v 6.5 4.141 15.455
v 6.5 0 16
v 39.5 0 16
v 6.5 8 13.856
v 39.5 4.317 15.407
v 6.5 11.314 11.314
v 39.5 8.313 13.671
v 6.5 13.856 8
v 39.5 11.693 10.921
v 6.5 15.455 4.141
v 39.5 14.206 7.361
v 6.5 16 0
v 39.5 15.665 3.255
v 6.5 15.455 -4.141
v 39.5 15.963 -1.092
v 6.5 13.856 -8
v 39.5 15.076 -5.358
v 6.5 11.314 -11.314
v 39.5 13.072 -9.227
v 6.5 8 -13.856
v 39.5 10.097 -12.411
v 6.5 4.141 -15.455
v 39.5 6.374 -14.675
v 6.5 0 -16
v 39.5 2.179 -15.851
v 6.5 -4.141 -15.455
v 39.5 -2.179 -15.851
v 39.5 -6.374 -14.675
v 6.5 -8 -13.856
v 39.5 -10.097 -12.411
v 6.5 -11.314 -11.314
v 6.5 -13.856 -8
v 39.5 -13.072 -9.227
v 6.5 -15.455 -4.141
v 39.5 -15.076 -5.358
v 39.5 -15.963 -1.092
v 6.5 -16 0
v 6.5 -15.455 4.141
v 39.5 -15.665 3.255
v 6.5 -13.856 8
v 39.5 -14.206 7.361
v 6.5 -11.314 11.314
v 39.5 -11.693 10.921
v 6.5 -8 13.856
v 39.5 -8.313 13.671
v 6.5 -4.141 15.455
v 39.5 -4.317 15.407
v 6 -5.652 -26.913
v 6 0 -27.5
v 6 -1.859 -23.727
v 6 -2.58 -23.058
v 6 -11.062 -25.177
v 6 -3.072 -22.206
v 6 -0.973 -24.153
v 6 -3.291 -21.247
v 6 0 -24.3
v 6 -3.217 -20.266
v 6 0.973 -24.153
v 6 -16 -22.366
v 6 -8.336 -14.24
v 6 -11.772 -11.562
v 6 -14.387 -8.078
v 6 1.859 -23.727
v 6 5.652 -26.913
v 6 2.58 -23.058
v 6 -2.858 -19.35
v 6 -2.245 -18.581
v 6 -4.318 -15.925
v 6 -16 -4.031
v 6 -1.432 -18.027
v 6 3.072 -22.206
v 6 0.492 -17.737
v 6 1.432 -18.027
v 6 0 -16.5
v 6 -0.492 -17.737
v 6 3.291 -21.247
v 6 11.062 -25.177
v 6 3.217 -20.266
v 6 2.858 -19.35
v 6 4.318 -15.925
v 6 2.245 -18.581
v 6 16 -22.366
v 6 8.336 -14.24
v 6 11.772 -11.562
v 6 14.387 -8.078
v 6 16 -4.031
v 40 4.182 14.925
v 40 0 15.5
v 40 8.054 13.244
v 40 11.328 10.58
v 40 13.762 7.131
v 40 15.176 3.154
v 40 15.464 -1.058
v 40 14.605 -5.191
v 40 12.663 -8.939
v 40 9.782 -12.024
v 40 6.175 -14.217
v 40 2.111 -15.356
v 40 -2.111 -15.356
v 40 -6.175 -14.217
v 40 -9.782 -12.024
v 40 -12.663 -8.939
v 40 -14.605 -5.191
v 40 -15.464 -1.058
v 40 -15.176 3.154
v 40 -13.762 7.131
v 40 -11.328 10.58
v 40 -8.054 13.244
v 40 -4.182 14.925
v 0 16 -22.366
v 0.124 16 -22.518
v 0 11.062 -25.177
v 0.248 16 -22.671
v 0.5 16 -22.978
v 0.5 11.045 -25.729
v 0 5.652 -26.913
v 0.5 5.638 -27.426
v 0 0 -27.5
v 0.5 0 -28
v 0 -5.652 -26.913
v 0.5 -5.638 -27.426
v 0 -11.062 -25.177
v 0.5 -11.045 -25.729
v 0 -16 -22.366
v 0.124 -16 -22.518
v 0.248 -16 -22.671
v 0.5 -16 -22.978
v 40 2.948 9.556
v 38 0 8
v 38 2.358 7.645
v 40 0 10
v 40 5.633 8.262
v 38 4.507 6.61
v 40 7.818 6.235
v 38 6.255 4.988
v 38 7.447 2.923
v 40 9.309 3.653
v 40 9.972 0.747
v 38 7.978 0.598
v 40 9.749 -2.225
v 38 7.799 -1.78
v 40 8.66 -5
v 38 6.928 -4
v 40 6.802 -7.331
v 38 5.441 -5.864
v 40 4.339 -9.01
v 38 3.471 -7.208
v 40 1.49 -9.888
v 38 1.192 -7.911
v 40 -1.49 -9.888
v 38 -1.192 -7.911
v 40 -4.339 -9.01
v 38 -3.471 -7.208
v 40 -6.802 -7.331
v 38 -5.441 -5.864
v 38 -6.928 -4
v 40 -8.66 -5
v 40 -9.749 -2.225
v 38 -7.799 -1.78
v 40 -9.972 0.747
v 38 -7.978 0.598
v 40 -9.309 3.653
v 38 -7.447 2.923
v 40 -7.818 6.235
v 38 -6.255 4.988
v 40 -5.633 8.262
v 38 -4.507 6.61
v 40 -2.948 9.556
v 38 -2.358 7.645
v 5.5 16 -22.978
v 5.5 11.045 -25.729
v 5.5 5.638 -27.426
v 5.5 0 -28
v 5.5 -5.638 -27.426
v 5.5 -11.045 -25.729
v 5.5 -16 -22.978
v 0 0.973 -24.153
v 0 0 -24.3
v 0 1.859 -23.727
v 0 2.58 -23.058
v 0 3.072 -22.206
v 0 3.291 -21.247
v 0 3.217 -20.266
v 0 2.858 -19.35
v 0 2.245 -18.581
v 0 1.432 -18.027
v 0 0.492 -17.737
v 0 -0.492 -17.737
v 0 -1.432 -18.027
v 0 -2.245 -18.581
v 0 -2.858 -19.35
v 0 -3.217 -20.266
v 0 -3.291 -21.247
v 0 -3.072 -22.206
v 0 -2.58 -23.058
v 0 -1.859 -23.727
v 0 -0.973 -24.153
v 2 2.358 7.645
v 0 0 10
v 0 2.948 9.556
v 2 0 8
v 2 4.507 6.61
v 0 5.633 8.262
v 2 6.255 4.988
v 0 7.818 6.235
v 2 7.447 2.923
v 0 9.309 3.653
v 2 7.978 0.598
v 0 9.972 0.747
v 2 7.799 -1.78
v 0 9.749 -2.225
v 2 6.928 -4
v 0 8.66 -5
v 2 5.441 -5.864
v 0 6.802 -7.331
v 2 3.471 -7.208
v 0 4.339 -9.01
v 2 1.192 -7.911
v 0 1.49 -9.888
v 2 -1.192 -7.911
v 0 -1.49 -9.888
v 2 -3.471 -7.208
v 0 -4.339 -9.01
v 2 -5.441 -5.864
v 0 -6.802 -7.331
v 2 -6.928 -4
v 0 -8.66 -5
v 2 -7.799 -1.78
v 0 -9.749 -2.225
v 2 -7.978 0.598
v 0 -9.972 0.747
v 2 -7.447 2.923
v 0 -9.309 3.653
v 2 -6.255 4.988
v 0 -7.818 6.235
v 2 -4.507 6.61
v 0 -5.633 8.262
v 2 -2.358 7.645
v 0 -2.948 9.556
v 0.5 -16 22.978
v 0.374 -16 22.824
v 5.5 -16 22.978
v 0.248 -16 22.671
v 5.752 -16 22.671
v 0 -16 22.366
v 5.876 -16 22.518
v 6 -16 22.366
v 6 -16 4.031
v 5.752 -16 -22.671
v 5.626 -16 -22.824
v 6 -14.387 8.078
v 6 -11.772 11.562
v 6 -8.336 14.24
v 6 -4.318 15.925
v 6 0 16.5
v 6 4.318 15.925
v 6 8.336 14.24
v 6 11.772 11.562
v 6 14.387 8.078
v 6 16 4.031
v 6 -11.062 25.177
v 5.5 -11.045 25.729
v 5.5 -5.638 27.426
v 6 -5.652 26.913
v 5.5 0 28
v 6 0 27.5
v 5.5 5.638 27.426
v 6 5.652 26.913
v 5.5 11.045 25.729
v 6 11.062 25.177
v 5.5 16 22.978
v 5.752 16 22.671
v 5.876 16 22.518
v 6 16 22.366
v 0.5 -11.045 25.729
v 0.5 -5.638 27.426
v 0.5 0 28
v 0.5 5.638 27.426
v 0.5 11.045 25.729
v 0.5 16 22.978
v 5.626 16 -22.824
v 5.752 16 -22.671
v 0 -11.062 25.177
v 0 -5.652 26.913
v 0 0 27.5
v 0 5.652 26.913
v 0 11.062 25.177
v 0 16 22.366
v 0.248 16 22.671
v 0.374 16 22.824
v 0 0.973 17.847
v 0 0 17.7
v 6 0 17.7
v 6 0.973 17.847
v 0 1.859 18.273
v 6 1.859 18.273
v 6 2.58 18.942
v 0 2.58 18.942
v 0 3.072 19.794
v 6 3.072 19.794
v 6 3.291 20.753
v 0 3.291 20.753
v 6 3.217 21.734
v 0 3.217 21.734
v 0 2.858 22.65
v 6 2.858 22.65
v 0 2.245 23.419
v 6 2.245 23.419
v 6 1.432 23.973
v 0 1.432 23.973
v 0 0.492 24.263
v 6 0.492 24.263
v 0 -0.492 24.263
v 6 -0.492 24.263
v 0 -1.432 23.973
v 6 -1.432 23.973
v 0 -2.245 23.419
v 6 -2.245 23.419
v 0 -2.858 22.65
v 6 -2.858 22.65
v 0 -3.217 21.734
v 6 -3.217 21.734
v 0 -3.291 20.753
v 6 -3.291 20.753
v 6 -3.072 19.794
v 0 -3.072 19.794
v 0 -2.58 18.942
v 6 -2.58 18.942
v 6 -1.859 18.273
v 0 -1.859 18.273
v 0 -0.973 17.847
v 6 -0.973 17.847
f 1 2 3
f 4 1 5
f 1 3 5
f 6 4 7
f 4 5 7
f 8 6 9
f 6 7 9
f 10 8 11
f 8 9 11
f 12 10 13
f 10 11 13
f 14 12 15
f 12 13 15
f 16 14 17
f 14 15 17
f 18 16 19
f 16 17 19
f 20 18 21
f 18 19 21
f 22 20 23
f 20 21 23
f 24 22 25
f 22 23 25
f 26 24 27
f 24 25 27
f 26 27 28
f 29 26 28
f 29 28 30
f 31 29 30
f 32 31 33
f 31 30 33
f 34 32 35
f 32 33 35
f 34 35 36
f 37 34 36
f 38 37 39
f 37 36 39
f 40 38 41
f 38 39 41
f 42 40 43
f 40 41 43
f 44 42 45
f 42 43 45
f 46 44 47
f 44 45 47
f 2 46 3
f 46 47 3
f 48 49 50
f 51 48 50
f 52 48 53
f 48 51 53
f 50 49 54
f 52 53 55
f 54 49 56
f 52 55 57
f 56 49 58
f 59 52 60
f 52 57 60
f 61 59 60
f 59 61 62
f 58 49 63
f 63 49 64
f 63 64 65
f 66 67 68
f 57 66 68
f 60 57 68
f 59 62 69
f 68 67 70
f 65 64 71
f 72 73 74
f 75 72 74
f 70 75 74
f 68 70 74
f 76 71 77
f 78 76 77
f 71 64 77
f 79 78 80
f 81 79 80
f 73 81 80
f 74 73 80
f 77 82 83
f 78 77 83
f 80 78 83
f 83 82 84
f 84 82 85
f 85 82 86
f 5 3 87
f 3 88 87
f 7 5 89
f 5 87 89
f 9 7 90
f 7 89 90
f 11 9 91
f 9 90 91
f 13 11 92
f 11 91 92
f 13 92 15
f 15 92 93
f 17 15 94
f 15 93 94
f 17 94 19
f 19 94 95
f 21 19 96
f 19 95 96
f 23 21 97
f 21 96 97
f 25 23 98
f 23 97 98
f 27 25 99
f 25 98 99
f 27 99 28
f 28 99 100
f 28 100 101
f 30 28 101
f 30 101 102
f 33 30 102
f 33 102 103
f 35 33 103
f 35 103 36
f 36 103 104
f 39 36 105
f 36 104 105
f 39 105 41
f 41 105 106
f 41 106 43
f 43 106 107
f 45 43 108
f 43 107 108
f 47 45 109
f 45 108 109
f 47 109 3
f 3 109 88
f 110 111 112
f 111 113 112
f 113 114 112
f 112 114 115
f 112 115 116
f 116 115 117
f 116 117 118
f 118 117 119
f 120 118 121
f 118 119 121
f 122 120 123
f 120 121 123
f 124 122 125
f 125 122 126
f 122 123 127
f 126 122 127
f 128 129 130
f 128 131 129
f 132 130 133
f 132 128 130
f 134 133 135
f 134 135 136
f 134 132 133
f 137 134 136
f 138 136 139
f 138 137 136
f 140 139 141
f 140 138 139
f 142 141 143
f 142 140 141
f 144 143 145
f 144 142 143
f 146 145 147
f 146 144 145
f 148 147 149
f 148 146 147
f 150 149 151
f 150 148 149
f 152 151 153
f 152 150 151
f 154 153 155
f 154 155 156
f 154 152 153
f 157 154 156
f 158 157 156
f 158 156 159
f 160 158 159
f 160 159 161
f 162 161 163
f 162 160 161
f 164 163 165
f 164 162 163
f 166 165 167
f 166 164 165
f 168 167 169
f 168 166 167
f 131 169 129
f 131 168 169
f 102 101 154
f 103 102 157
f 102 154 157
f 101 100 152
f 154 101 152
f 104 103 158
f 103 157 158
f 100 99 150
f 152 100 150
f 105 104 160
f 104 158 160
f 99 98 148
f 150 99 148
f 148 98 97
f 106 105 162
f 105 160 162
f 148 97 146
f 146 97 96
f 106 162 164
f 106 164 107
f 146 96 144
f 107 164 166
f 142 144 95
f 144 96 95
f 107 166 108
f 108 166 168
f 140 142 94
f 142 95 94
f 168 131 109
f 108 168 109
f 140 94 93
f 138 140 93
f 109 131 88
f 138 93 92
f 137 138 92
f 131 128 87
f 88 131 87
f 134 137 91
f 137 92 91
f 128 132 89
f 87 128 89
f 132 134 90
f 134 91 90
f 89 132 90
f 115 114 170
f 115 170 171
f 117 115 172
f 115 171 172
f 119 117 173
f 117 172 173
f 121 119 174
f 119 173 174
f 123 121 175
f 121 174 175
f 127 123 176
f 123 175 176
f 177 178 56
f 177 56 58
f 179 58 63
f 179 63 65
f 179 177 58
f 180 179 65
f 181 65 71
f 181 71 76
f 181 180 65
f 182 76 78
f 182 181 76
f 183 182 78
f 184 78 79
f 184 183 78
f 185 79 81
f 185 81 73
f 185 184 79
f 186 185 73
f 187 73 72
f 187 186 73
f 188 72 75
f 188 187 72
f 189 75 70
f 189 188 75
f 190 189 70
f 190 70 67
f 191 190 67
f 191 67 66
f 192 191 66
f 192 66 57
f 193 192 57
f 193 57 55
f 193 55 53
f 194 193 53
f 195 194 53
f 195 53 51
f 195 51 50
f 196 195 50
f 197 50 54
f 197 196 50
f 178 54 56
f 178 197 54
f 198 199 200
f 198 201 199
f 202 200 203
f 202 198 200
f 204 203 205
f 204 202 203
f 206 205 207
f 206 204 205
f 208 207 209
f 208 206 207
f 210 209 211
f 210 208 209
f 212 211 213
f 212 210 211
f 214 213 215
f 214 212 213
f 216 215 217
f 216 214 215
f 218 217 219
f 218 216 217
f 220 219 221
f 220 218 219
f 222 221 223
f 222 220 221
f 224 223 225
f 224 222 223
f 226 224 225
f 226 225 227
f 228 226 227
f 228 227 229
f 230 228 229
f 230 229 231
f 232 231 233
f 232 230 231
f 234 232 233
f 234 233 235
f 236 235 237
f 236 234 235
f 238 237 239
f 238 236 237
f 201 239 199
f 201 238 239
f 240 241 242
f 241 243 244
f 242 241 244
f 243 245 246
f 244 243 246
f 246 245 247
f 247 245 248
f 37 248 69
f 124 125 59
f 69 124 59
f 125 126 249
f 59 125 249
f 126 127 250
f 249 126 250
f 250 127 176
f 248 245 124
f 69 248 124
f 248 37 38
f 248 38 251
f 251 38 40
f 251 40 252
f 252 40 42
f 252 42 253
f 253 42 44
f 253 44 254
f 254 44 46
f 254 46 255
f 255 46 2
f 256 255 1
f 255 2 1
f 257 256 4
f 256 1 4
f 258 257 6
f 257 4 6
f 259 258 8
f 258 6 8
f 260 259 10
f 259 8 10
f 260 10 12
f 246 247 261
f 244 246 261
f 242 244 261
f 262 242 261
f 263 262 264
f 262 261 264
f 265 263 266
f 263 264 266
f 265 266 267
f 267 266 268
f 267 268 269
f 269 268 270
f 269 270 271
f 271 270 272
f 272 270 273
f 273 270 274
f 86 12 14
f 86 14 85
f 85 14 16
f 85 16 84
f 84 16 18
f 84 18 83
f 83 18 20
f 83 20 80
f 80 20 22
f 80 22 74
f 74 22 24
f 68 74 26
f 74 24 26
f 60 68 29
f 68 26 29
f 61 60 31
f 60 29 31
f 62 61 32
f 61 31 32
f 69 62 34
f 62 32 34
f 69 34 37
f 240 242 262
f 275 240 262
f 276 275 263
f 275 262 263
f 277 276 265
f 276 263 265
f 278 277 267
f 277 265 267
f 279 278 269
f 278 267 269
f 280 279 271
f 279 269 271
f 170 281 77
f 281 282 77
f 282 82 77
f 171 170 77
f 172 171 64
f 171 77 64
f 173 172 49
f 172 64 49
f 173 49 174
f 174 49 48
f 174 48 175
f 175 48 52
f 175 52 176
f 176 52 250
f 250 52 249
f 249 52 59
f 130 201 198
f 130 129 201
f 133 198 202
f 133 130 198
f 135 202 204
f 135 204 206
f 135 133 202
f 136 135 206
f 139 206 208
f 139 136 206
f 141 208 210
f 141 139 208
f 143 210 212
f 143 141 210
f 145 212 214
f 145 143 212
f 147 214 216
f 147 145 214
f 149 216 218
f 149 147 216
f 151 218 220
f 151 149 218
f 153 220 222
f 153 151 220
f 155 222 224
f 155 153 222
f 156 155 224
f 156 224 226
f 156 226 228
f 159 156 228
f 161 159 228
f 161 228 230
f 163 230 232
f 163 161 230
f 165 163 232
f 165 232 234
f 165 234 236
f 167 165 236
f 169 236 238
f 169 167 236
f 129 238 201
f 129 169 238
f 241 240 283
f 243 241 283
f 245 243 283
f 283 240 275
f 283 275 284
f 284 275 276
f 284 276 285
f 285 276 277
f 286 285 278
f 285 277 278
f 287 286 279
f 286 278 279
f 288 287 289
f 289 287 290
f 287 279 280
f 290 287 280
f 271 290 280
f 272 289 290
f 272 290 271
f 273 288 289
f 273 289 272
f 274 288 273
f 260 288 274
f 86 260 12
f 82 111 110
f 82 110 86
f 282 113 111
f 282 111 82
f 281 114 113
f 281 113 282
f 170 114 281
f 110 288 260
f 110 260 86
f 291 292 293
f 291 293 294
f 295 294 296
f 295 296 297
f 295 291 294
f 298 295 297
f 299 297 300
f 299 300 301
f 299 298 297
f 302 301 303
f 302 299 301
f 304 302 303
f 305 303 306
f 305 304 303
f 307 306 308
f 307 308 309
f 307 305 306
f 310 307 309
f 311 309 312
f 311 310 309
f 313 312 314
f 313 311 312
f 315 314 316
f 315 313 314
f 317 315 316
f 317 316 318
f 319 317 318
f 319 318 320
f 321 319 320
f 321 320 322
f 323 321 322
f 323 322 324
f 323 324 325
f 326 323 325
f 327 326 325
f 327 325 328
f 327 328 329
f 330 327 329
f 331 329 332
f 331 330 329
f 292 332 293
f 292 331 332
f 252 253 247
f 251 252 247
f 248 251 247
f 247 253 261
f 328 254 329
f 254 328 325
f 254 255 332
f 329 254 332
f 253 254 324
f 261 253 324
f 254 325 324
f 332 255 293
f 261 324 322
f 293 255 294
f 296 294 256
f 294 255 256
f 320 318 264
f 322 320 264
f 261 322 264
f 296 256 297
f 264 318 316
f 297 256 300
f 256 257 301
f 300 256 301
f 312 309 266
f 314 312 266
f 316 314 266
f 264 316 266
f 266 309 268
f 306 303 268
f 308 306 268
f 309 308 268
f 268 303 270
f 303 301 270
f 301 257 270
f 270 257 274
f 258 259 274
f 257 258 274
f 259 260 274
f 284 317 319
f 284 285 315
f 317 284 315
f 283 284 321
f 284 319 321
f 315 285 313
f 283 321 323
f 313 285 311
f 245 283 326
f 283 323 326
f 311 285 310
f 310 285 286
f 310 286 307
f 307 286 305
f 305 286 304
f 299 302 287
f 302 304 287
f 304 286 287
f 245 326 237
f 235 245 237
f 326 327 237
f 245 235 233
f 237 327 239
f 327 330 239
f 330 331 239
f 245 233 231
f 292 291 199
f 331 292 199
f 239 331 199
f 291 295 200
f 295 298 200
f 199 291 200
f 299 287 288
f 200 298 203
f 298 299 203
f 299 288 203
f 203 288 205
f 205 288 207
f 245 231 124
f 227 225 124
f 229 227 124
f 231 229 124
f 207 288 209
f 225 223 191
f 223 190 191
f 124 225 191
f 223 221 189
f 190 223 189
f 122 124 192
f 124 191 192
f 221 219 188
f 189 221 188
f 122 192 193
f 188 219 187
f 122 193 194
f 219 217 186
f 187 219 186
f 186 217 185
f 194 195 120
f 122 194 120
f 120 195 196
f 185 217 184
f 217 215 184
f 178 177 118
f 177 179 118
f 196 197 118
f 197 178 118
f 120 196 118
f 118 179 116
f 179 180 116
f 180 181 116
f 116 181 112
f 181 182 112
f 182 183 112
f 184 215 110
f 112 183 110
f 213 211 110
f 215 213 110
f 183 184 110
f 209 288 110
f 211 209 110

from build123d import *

# Parameters (mm, degrees)
SKETCH_3_R               = 3.3
CUT_EXTRUDE_1_DEPTH      = 6
SKETCH_4_R               = 3.3
CUT_EXTRUDE_2_DEPTH      = 6
SKETCH_5_R               = 3.3
CUT_EXTRUDE_3_DEPTH      = 6
SKETCH_6_R               = 3.3
CUT_EXTRUDE_4_DEPTH      = 6
CUT_EXTRUDE_5_DEPTH      = 42
CUT_EXTRUDE_5_DEPTH_BACK = 42
SKETCH_7_W               = 40
SKETCH_7_H               = 32
CUT_EXTRUDE_6_DEPTH      = 42
CUT_EXTRUDE_6_DEPTH_BACK = 42
SKETCH_8_W               = 40
SKETCH_8_H               = 32


with BuildPart() as part:
    # 草图1 → 旋转1 (revolve)
    with BuildSketch(Plane.XY):
        with BuildLine():
            Line((0, 0), (0, 27.5))
            Line((0, 27.5), (0.5, 28))
            Line((0.5, 28), (5.5, 28))
            Line((5.5, 28), (6, 27.5))
            Line((6, 27.5), (6, 16.5))
            ThreePointArc((6, 16.5), (6.146446609, 16.146446609), (6.5, 16))
            Line((6.5, 16), (39.5, 16))
            Line((39.5, 16), (40, 15.5))
            Line((40, 15.5), (40, 0))
            Line((40, 0), (0, 0))
        make_face()
    revolve(axis=Axis((40, 0, 0), (-1, 0, 0)))

    # 草图2 → 切除-旋转1 (revolve, cut)
    with BuildSketch(Plane.XY):
        Polygon((0, 0), (0, 10), (2, 8), (38, 8), (40, 10), (40, 0), align=None)
    revolve(axis=Axis((40, 0, 0), (-1, 0, 0)), mode=Mode.SUBTRACT)

    # 草图3 → 切除-拉伸1 (cut)
    with BuildSketch(Plane(origin=(0, 0, 0), x_dir=(0, 0, -1), z_dir=(1, 0, 0))):
        with Locations((21, 0)):
            Circle(SKETCH_3_R)
    extrude(amount=CUT_EXTRUDE_1_DEPTH, mode=Mode.SUBTRACT)

    # 草图4 → 切除-拉伸2 (cut)
    with BuildSketch(Plane(origin=(0, 0, 0), x_dir=(0, 0, -1), z_dir=(1, 0, 0))):
        with Locations((-21, 0)):
            Circle(SKETCH_4_R)
    extrude(amount=CUT_EXTRUDE_2_DEPTH, mode=Mode.SUBTRACT)

    # 草图5 → 切除-拉伸3 (cut)
    with BuildSketch(Plane(origin=(0, 0, 0), x_dir=(0, 0, -1), z_dir=(1, 0, 0))):
        with Locations((0, 21)):
            Circle(SKETCH_5_R)
    extrude(amount=CUT_EXTRUDE_3_DEPTH, mode=Mode.SUBTRACT)

    # 草图6 → 切除-拉伸4 (cut)
    with BuildSketch(Plane(origin=(0, 0, 0), x_dir=(0, 0, -1), z_dir=(1, 0, 0))):
        with Locations((0, -21)):
            Circle(SKETCH_6_R)
    extrude(amount=CUT_EXTRUDE_4_DEPTH, mode=Mode.SUBTRACT)

    # 草图7 → 切除-拉伸5 (cut, two sides: drawn at the far end of the back side and taken through both)
    with BuildSketch(Plane.XY.offset(-CUT_EXTRUDE_5_DEPTH_BACK)):
        with Locations((20, 32)):
            Rectangle(SKETCH_7_W, SKETCH_7_H)
    extrude(amount=CUT_EXTRUDE_5_DEPTH + CUT_EXTRUDE_5_DEPTH_BACK, mode=Mode.SUBTRACT)

    # 草图8 → 切除-拉伸6 (cut, two sides: drawn at the far end of the back side and taken through both)
    with BuildSketch(Plane.XY.offset(-CUT_EXTRUDE_6_DEPTH_BACK)):
        with Locations((20, -32)):
            Rectangle(SKETCH_8_W, SKETCH_8_H)
    extrude(amount=CUT_EXTRUDE_6_DEPTH + CUT_EXTRUDE_6_DEPTH_BACK, mode=Mode.SUBTRACT)


solid = part.part
